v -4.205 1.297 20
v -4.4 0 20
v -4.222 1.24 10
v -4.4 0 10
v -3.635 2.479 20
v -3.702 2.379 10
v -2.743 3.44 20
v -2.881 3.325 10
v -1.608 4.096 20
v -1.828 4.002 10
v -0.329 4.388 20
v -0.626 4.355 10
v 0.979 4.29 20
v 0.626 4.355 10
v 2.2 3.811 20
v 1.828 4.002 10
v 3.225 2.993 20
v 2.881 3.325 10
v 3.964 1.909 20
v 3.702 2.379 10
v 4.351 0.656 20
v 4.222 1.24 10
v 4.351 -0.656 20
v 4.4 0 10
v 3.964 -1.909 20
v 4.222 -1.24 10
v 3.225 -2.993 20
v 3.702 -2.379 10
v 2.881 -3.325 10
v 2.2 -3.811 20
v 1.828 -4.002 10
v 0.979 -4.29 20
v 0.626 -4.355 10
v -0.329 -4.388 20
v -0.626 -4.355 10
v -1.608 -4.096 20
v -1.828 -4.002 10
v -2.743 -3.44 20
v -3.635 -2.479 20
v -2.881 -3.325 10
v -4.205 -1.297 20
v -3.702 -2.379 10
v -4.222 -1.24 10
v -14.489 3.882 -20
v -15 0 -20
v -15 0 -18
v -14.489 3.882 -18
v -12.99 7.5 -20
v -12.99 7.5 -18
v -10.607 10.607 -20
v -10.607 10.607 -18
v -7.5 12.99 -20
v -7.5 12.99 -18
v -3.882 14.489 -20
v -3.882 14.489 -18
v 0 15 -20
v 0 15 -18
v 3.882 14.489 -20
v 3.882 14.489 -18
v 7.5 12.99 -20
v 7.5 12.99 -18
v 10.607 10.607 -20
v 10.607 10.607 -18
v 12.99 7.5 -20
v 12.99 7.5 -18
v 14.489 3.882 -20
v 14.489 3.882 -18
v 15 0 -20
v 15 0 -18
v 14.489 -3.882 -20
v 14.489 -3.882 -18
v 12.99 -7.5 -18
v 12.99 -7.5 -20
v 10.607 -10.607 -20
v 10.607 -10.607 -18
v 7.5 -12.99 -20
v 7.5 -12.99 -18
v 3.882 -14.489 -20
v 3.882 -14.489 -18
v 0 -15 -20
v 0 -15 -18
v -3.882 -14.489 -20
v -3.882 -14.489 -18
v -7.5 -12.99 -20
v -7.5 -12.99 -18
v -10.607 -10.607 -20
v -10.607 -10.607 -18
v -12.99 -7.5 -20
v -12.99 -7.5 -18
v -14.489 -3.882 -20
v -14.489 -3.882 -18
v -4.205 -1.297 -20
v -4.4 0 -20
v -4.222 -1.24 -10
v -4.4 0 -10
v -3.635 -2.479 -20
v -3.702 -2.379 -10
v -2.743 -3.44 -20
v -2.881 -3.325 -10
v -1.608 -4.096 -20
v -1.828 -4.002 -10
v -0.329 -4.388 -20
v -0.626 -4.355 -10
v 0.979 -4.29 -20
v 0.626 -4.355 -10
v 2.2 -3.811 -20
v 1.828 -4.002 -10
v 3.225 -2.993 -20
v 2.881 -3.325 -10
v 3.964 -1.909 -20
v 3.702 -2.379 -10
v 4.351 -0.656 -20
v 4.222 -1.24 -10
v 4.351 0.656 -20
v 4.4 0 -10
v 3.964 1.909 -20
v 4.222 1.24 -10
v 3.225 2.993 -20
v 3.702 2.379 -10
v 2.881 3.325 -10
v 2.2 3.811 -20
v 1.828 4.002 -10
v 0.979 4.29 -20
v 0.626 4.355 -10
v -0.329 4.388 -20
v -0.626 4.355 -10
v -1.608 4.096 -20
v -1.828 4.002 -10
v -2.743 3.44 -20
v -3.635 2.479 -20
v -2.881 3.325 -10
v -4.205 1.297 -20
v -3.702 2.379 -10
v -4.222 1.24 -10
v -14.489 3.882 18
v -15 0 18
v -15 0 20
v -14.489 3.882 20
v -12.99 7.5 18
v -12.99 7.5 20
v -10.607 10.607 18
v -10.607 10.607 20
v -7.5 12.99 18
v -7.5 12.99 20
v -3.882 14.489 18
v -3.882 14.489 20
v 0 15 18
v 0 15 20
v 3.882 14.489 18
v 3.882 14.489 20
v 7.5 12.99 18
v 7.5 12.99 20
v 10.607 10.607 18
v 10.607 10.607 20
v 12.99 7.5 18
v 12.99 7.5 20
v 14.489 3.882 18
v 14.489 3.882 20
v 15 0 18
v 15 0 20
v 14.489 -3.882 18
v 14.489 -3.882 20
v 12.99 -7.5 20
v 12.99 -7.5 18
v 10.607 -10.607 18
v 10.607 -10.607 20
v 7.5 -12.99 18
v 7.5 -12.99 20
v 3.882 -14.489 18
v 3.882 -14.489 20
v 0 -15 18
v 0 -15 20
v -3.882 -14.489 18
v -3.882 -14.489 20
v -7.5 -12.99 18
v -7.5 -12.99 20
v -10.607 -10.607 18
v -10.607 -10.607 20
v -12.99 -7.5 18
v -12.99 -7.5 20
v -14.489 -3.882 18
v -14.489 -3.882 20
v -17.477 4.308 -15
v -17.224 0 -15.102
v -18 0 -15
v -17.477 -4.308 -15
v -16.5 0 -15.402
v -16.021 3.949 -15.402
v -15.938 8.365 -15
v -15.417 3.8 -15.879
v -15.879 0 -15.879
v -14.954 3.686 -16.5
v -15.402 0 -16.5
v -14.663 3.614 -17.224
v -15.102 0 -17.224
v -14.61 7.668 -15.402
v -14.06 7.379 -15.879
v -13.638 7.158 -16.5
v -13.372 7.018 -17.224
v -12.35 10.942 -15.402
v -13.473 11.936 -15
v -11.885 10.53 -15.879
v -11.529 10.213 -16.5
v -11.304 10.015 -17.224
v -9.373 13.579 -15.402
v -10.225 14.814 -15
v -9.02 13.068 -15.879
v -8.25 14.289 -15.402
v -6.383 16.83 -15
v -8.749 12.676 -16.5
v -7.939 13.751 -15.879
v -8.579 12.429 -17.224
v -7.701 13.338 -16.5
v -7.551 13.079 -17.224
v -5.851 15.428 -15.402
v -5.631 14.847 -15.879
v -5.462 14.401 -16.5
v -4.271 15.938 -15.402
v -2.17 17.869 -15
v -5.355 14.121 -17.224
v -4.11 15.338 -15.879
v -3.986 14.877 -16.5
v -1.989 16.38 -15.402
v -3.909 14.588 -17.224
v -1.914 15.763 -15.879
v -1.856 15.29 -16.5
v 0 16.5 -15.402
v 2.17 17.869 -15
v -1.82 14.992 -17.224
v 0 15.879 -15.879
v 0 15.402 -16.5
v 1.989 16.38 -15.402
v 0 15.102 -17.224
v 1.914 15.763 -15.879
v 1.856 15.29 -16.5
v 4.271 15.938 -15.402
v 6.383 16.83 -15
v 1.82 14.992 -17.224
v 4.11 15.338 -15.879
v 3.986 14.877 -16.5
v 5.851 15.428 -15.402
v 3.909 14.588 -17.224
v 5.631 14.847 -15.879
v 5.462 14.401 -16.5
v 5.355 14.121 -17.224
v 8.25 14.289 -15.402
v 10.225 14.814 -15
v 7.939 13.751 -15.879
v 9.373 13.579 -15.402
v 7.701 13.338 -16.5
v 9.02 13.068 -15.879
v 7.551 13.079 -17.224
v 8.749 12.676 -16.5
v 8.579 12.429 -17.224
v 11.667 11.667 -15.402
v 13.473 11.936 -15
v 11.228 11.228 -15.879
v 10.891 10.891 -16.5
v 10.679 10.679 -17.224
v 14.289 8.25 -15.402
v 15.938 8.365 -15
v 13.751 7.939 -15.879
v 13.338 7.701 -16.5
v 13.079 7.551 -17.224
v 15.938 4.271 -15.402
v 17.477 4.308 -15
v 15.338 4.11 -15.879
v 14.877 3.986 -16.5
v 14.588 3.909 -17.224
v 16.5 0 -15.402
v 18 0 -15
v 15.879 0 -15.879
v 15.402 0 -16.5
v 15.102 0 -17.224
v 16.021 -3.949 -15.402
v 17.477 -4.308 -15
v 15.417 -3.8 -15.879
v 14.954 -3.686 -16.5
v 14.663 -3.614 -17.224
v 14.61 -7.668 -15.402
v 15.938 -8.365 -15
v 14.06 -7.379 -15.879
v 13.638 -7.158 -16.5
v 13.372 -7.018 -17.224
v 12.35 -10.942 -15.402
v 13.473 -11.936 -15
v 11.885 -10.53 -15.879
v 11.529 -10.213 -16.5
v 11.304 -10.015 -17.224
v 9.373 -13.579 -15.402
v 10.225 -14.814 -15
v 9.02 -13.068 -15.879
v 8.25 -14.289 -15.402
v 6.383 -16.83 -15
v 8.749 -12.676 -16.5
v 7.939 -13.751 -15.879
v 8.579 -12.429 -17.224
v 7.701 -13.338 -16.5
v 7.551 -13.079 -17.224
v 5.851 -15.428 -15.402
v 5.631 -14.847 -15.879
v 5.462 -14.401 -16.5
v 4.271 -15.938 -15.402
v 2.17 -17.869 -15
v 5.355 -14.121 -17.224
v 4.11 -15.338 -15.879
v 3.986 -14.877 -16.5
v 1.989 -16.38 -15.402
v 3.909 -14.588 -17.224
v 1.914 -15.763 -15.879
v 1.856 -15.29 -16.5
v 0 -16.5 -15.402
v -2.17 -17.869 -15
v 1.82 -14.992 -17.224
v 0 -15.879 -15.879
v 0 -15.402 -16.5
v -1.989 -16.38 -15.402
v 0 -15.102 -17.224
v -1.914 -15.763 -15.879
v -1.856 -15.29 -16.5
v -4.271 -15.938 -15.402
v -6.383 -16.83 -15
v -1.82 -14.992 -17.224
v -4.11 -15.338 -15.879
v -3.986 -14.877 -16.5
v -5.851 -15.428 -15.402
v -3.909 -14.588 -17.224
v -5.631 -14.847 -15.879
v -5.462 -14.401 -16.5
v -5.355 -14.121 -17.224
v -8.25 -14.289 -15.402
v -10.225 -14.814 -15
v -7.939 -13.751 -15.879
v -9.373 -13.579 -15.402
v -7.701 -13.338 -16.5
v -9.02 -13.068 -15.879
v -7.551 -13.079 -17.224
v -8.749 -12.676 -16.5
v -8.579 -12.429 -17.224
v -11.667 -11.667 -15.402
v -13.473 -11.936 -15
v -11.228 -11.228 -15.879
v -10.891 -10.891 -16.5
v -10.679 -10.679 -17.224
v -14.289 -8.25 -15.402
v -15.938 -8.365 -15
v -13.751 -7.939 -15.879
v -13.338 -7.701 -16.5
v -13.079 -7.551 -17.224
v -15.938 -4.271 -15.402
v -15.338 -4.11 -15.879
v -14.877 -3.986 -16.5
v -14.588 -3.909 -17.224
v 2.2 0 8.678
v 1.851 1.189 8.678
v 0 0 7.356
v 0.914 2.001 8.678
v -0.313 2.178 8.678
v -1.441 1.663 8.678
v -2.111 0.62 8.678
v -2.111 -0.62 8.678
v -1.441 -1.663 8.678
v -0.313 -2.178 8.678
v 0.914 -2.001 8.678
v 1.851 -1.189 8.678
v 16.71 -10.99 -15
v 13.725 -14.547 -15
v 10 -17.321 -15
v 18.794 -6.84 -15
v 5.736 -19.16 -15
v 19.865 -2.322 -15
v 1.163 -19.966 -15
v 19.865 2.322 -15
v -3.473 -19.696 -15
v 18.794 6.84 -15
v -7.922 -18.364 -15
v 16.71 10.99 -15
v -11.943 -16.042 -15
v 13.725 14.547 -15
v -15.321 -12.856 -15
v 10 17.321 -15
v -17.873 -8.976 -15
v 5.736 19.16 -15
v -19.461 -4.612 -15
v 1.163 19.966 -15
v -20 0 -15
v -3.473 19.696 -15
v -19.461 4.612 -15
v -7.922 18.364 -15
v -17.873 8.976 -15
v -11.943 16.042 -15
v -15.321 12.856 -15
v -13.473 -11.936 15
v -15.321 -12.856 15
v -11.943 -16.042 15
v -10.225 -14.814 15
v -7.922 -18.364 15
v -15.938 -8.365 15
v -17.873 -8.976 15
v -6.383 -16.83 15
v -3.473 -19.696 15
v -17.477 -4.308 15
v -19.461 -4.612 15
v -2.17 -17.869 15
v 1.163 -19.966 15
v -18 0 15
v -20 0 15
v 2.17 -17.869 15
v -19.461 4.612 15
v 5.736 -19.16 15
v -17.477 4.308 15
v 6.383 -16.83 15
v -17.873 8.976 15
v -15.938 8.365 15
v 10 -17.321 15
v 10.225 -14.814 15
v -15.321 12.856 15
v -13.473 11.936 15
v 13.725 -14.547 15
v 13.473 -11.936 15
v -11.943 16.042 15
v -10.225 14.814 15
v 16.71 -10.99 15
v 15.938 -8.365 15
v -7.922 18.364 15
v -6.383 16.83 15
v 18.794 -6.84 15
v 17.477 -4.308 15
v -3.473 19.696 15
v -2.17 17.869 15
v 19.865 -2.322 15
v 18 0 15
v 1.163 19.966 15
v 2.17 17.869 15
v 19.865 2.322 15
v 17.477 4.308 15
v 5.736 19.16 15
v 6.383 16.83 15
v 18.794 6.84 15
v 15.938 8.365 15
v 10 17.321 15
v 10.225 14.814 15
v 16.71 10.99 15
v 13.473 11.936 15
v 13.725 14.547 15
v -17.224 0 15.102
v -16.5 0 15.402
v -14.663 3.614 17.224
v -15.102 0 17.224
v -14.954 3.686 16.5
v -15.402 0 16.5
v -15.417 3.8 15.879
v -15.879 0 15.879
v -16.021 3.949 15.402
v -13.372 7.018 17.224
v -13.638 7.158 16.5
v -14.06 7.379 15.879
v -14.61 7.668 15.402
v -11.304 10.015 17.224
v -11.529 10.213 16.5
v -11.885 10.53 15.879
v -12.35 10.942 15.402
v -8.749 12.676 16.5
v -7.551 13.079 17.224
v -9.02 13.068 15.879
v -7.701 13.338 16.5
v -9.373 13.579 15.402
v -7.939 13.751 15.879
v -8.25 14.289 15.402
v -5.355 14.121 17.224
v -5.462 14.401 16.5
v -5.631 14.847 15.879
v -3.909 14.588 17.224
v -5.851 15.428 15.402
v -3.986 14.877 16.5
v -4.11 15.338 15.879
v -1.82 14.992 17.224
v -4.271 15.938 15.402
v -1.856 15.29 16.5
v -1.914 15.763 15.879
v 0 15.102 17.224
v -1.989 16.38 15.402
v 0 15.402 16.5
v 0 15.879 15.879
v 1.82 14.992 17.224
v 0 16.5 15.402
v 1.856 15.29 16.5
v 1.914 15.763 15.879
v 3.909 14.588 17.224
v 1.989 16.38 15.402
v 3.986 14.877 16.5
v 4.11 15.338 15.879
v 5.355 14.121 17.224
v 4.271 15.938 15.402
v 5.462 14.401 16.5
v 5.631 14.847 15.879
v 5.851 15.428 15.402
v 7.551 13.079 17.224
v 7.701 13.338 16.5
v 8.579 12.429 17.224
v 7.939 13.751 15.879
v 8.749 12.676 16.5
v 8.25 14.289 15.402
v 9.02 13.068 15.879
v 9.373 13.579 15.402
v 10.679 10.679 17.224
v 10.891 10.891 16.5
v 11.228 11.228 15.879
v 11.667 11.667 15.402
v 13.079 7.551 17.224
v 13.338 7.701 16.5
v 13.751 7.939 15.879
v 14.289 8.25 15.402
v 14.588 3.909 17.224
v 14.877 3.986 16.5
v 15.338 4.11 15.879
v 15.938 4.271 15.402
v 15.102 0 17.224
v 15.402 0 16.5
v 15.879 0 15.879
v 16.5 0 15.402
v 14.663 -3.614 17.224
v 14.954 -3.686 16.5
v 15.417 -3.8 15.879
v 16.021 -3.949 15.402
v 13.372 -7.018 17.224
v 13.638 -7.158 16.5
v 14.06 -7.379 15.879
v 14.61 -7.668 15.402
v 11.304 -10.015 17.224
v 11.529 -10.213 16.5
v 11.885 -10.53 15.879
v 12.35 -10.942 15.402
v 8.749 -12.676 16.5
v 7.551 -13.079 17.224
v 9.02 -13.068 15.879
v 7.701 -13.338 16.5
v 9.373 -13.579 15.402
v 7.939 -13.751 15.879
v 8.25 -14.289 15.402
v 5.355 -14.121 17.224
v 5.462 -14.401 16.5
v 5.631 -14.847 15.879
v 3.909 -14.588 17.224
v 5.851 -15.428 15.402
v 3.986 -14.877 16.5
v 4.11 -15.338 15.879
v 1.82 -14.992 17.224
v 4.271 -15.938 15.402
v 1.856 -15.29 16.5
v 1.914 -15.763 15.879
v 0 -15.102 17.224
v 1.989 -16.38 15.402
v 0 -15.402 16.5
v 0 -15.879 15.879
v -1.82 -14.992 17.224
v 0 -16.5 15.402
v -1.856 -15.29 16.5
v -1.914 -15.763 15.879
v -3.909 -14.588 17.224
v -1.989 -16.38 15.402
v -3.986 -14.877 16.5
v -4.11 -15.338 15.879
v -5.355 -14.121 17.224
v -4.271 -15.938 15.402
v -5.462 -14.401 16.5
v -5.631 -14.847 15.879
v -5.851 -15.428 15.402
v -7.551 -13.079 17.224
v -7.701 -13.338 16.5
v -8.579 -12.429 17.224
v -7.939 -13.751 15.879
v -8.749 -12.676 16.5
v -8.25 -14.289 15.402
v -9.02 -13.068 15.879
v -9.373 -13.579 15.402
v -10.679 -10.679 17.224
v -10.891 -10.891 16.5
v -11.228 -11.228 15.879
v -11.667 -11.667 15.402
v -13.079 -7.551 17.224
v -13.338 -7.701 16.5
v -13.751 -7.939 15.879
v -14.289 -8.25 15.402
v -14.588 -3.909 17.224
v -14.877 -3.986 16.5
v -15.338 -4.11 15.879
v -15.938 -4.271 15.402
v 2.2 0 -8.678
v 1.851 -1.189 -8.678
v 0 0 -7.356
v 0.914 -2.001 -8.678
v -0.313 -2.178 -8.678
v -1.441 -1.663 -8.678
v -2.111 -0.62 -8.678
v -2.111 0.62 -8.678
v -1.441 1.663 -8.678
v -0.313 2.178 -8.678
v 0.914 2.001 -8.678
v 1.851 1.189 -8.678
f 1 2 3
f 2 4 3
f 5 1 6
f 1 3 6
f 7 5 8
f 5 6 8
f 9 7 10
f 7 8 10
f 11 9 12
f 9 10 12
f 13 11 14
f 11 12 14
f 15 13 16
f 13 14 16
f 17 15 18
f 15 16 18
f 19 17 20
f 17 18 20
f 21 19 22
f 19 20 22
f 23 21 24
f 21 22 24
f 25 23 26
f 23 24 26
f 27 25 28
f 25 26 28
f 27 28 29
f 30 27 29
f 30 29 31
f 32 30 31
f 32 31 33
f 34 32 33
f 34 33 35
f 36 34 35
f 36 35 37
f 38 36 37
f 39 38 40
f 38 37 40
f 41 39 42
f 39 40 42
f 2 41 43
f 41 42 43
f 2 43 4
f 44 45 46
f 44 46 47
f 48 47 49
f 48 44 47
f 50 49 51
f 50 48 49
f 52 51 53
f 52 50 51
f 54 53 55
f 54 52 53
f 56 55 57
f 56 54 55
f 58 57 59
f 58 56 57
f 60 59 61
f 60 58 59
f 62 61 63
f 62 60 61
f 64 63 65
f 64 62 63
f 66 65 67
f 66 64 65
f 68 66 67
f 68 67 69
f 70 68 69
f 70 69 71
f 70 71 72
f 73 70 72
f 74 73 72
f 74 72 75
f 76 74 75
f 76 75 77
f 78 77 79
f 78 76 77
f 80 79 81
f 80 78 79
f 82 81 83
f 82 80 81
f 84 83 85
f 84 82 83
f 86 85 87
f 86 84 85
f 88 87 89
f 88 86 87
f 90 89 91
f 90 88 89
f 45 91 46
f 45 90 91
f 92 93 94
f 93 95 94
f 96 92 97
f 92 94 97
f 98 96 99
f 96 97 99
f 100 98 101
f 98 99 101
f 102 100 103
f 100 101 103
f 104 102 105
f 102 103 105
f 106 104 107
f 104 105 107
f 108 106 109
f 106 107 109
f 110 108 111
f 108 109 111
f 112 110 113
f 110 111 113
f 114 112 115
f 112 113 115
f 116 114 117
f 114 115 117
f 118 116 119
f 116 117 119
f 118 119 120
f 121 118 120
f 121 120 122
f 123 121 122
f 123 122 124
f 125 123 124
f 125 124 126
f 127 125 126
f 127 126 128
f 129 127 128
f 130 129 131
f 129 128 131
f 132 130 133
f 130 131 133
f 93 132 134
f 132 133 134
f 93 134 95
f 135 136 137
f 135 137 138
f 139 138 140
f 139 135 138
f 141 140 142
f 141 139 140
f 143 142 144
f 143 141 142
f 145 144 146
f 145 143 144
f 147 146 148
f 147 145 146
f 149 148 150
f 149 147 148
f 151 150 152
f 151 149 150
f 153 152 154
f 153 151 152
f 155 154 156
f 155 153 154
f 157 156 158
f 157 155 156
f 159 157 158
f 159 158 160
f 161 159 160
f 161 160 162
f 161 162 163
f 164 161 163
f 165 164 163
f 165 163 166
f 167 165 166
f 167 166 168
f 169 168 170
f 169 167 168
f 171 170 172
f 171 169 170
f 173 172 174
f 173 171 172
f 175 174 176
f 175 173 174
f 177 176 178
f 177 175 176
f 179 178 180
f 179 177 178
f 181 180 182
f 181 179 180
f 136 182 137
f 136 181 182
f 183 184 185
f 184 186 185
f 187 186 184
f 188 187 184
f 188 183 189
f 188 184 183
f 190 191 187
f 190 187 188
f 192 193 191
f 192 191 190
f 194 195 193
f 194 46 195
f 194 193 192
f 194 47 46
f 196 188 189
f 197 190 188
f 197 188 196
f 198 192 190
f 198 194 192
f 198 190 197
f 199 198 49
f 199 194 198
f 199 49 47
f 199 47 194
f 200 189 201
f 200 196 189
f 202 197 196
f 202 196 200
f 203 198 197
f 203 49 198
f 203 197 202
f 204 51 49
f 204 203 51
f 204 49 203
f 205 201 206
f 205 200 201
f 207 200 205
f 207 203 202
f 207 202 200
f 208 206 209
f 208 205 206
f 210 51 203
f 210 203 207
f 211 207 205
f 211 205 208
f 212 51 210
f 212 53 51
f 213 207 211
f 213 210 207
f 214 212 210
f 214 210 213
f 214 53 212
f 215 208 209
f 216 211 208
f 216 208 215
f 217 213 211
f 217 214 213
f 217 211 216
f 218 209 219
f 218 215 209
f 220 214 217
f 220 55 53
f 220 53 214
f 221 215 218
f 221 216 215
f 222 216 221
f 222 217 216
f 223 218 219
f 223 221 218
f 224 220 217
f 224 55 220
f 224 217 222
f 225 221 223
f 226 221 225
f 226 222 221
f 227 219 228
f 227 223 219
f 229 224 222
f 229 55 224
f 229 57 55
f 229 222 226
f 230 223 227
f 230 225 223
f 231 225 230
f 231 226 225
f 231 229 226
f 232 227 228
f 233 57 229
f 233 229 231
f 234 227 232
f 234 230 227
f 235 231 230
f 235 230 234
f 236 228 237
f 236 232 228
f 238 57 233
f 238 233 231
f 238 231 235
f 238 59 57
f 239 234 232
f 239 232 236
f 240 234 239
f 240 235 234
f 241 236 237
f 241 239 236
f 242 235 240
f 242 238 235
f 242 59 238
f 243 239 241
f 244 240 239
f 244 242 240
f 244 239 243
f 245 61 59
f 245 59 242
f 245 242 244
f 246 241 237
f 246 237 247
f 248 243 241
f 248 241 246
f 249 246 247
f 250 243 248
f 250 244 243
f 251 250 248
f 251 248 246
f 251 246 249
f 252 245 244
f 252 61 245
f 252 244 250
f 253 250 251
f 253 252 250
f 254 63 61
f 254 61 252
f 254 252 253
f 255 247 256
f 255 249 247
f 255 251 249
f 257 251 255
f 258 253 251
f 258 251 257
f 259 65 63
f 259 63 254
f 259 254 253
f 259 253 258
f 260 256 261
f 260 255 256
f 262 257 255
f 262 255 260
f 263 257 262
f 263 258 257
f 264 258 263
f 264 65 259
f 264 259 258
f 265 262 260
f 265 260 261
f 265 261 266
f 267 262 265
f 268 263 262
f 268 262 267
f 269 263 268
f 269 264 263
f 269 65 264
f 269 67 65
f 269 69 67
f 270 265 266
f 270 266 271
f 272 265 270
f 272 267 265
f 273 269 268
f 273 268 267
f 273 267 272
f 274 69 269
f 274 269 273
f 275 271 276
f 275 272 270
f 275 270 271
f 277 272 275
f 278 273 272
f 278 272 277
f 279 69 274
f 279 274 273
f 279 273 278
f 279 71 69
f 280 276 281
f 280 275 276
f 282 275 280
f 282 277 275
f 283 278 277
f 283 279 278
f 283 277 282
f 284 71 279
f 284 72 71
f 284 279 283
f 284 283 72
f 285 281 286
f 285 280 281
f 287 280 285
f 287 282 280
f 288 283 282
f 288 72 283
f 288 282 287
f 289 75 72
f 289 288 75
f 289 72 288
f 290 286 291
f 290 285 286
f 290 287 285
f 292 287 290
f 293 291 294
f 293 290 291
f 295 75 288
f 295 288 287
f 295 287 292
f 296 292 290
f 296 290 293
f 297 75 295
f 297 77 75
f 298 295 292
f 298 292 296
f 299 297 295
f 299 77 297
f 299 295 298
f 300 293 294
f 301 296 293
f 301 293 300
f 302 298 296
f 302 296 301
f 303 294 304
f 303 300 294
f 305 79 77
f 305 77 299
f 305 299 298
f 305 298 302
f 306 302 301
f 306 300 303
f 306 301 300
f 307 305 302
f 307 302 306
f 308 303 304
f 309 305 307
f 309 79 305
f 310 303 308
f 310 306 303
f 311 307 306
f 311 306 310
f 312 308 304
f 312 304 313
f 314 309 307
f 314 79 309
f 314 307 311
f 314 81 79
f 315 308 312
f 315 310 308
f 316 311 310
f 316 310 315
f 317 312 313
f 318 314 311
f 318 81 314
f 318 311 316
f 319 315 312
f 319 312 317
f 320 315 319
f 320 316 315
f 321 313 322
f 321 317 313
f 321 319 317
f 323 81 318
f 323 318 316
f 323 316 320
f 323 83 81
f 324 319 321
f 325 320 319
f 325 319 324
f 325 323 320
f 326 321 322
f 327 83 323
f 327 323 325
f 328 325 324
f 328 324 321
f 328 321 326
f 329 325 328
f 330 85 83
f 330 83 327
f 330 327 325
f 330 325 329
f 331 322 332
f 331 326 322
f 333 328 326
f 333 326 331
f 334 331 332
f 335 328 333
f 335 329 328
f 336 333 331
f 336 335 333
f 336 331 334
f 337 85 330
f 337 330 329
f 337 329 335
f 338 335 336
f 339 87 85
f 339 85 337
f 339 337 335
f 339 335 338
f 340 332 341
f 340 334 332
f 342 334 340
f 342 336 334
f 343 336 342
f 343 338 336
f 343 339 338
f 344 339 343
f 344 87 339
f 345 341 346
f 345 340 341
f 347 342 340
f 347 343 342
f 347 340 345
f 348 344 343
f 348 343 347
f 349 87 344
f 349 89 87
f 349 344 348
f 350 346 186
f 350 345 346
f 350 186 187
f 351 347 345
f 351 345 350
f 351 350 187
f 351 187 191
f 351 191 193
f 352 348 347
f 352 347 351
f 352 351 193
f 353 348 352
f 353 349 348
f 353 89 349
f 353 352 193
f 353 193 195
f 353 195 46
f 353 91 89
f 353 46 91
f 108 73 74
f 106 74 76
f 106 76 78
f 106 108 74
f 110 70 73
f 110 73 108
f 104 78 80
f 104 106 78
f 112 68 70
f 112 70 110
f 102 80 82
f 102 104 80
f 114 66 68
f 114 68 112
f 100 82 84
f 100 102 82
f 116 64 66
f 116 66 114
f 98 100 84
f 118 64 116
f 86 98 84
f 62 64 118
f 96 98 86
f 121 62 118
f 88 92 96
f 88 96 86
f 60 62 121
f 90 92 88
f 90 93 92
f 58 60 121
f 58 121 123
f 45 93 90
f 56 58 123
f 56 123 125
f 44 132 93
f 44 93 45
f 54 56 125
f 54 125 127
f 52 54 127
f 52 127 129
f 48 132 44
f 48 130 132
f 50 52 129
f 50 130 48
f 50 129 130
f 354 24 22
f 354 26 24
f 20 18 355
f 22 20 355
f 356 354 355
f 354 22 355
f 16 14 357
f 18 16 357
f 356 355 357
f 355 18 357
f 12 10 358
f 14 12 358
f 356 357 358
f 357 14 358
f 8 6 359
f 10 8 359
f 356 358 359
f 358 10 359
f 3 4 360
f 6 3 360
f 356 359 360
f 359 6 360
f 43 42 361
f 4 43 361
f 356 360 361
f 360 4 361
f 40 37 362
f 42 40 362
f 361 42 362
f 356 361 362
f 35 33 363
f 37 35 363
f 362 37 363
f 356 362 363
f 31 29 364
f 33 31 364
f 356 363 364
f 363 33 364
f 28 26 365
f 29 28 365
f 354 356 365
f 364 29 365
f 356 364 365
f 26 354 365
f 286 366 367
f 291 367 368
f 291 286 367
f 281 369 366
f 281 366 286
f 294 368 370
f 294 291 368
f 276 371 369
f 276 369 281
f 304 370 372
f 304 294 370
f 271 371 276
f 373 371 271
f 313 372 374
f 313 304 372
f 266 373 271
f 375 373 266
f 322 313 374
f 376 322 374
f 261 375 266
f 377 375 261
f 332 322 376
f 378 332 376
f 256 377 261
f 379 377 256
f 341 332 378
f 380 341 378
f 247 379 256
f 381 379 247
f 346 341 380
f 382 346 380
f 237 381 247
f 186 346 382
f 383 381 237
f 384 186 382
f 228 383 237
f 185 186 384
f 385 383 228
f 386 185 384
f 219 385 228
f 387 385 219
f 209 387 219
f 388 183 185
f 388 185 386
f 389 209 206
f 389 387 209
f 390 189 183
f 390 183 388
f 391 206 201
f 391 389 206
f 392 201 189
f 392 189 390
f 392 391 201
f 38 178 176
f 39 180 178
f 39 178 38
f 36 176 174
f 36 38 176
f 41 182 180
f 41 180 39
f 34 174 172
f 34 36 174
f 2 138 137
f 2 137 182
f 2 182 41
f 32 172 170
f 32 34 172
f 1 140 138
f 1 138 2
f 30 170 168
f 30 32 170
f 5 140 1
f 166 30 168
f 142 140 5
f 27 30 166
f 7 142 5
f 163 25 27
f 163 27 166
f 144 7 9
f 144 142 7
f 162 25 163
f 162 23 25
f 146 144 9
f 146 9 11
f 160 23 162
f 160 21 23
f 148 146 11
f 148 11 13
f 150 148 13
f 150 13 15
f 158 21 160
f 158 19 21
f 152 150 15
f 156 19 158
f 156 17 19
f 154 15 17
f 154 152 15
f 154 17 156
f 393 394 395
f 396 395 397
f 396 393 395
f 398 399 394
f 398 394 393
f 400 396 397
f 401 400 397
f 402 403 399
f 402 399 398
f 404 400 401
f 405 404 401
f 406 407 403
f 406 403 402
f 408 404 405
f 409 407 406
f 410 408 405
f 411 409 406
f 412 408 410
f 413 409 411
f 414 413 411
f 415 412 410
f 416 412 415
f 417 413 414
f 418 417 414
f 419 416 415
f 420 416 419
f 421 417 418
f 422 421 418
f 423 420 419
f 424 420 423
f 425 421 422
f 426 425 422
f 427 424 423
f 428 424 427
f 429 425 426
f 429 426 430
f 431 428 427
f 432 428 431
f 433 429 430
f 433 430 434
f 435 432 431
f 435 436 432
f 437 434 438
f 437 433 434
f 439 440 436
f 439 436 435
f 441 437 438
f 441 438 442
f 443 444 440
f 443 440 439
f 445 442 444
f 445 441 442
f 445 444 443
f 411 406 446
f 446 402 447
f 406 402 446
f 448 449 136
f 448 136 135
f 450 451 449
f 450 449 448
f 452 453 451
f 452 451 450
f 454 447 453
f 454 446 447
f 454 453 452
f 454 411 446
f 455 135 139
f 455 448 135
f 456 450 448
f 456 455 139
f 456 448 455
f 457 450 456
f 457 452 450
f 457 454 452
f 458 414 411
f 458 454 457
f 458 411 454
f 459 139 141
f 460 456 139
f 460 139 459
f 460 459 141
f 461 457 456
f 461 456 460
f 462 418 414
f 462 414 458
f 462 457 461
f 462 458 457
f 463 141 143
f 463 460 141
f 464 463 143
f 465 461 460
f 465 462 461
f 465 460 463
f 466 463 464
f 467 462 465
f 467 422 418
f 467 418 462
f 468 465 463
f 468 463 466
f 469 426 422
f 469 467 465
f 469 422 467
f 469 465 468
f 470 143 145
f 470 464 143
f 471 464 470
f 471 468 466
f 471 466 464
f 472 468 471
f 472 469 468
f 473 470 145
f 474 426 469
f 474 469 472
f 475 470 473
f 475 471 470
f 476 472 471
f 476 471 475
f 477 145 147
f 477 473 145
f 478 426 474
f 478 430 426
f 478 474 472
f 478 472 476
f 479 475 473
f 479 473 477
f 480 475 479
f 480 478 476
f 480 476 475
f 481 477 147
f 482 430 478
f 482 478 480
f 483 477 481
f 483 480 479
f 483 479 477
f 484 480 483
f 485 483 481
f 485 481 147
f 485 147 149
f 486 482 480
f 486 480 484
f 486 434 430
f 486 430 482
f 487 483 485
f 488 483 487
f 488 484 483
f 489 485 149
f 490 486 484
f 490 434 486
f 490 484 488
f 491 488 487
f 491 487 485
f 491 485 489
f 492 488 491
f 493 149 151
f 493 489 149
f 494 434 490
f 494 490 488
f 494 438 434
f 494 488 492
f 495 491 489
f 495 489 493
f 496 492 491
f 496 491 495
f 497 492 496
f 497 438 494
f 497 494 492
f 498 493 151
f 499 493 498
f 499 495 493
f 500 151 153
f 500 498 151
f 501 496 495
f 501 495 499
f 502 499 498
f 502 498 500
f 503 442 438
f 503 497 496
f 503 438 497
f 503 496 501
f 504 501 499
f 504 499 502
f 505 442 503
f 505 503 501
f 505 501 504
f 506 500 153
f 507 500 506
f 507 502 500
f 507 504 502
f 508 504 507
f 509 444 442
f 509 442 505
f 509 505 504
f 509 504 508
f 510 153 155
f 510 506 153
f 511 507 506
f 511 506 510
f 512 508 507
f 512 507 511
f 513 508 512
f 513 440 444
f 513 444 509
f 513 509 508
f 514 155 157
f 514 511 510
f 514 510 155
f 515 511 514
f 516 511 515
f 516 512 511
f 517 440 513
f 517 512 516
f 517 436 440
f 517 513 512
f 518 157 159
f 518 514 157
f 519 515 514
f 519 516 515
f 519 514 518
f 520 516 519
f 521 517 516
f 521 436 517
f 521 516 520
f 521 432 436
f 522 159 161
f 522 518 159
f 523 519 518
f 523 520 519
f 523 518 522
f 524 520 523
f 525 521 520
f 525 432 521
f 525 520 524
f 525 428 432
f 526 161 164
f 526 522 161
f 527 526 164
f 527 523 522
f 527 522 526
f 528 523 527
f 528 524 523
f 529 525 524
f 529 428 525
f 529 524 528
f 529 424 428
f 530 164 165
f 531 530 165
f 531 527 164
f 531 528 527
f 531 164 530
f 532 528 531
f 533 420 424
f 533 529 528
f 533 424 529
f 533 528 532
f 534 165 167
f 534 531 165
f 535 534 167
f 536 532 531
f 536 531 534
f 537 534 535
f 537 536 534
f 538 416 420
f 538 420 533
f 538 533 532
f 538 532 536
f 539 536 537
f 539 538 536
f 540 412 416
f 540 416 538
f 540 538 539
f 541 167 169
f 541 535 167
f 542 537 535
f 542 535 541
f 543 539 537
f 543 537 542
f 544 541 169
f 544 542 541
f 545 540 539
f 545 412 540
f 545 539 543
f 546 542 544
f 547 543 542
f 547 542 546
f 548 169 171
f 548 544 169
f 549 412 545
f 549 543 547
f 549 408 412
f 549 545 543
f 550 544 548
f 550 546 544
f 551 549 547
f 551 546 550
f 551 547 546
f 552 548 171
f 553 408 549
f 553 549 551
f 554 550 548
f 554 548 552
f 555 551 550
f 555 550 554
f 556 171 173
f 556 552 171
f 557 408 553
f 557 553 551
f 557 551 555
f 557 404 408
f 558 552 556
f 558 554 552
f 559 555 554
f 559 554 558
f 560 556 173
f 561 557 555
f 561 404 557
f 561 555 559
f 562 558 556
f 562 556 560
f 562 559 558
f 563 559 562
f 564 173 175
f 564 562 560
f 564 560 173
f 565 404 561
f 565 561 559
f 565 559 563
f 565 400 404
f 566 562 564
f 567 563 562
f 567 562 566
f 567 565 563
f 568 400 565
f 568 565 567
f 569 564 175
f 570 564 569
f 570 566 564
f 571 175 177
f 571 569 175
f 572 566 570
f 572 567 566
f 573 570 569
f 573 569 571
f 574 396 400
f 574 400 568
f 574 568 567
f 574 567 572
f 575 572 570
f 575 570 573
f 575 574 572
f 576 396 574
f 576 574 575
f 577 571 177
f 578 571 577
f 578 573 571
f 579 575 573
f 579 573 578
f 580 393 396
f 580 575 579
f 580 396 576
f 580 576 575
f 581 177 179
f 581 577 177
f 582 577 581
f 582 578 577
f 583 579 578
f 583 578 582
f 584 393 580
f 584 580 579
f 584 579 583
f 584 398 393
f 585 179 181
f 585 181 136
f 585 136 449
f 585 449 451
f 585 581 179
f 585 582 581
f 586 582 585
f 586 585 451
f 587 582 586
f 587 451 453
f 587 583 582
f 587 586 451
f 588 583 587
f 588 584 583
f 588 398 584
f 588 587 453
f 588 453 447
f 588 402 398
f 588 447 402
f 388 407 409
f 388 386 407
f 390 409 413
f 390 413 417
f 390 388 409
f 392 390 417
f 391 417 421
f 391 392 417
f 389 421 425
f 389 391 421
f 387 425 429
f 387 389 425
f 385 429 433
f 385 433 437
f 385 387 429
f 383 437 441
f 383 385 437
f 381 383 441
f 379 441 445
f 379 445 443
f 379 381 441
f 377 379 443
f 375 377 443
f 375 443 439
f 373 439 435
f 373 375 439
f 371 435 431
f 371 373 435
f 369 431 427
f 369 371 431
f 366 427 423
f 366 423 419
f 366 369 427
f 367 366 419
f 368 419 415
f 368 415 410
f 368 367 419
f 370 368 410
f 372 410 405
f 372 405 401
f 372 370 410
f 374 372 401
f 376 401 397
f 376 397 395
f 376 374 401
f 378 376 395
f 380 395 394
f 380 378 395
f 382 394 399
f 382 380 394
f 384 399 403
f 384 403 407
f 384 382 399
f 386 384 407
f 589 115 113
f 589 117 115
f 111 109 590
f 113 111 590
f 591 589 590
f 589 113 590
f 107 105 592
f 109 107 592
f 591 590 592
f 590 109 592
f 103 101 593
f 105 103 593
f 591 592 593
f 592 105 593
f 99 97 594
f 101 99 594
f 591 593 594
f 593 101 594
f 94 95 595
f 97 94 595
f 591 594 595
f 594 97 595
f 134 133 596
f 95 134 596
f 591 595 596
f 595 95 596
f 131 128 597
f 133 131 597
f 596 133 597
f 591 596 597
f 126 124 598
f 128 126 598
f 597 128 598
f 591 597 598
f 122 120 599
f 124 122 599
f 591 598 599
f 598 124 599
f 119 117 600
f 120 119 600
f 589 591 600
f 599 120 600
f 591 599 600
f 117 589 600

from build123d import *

# Parameters (mm, degrees)
F2_R           = 3
F5_D           = 8.8
F5_DEPTH       = 10
F5_TIP         = 2.6437867237
F5_ON_F3_D     = 8.8
F5_ON_F3_DEPTH = 10
F5_ON_F3_TIP   = 2.6437867237


with BuildPart() as f1:
    # F0 (on Front) → F1 (revolve)
    with BuildSketch(Plane.XZ):
        Polygon((0, -20), (0, 20), (-15, 20), (-15, 15), (-20, 15), (-20, -15), (-15, -15), (-15, -20), align=None)
    revolve(axis=Axis((0, 0, 0), (0, 0, -1)))

    # F2
    f2_edges = [f1.edges().sort_by_distance(p)[0] for p in [
        (15, 0, 15),
        (15, 0, -15),
    ]]
    fillet(f2_edges, radius=F2_R)

    # F5
    with Locations(Plane(origin=(0, 0, -20), x_dir=(1, 0, 0), z_dir=(0, 0, -1))):
        with Locations((0, 0)):
            Hole(F5_D / 2, depth=F5_DEPTH)
            with Locations((0, 0, -(F5_DEPTH + F5_TIP / 2))):  # 118° drill point
                Cone(0, F5_D / 2, F5_TIP, mode=Mode.SUBTRACT)

    # F5 on F3
    with Locations(Plane.XY.offset(20)):
        with Locations((0, 0)):
            Hole(F5_ON_F3_D / 2, depth=F5_ON_F3_DEPTH)
            with Locations((0, 0, -(F5_ON_F3_DEPTH + F5_ON_F3_TIP / 2))):  # 118° drill point
                Cone(0, F5_ON_F3_D / 2, F5_ON_F3_TIP, mode=Mode.SUBTRACT)


solid = f1.part
